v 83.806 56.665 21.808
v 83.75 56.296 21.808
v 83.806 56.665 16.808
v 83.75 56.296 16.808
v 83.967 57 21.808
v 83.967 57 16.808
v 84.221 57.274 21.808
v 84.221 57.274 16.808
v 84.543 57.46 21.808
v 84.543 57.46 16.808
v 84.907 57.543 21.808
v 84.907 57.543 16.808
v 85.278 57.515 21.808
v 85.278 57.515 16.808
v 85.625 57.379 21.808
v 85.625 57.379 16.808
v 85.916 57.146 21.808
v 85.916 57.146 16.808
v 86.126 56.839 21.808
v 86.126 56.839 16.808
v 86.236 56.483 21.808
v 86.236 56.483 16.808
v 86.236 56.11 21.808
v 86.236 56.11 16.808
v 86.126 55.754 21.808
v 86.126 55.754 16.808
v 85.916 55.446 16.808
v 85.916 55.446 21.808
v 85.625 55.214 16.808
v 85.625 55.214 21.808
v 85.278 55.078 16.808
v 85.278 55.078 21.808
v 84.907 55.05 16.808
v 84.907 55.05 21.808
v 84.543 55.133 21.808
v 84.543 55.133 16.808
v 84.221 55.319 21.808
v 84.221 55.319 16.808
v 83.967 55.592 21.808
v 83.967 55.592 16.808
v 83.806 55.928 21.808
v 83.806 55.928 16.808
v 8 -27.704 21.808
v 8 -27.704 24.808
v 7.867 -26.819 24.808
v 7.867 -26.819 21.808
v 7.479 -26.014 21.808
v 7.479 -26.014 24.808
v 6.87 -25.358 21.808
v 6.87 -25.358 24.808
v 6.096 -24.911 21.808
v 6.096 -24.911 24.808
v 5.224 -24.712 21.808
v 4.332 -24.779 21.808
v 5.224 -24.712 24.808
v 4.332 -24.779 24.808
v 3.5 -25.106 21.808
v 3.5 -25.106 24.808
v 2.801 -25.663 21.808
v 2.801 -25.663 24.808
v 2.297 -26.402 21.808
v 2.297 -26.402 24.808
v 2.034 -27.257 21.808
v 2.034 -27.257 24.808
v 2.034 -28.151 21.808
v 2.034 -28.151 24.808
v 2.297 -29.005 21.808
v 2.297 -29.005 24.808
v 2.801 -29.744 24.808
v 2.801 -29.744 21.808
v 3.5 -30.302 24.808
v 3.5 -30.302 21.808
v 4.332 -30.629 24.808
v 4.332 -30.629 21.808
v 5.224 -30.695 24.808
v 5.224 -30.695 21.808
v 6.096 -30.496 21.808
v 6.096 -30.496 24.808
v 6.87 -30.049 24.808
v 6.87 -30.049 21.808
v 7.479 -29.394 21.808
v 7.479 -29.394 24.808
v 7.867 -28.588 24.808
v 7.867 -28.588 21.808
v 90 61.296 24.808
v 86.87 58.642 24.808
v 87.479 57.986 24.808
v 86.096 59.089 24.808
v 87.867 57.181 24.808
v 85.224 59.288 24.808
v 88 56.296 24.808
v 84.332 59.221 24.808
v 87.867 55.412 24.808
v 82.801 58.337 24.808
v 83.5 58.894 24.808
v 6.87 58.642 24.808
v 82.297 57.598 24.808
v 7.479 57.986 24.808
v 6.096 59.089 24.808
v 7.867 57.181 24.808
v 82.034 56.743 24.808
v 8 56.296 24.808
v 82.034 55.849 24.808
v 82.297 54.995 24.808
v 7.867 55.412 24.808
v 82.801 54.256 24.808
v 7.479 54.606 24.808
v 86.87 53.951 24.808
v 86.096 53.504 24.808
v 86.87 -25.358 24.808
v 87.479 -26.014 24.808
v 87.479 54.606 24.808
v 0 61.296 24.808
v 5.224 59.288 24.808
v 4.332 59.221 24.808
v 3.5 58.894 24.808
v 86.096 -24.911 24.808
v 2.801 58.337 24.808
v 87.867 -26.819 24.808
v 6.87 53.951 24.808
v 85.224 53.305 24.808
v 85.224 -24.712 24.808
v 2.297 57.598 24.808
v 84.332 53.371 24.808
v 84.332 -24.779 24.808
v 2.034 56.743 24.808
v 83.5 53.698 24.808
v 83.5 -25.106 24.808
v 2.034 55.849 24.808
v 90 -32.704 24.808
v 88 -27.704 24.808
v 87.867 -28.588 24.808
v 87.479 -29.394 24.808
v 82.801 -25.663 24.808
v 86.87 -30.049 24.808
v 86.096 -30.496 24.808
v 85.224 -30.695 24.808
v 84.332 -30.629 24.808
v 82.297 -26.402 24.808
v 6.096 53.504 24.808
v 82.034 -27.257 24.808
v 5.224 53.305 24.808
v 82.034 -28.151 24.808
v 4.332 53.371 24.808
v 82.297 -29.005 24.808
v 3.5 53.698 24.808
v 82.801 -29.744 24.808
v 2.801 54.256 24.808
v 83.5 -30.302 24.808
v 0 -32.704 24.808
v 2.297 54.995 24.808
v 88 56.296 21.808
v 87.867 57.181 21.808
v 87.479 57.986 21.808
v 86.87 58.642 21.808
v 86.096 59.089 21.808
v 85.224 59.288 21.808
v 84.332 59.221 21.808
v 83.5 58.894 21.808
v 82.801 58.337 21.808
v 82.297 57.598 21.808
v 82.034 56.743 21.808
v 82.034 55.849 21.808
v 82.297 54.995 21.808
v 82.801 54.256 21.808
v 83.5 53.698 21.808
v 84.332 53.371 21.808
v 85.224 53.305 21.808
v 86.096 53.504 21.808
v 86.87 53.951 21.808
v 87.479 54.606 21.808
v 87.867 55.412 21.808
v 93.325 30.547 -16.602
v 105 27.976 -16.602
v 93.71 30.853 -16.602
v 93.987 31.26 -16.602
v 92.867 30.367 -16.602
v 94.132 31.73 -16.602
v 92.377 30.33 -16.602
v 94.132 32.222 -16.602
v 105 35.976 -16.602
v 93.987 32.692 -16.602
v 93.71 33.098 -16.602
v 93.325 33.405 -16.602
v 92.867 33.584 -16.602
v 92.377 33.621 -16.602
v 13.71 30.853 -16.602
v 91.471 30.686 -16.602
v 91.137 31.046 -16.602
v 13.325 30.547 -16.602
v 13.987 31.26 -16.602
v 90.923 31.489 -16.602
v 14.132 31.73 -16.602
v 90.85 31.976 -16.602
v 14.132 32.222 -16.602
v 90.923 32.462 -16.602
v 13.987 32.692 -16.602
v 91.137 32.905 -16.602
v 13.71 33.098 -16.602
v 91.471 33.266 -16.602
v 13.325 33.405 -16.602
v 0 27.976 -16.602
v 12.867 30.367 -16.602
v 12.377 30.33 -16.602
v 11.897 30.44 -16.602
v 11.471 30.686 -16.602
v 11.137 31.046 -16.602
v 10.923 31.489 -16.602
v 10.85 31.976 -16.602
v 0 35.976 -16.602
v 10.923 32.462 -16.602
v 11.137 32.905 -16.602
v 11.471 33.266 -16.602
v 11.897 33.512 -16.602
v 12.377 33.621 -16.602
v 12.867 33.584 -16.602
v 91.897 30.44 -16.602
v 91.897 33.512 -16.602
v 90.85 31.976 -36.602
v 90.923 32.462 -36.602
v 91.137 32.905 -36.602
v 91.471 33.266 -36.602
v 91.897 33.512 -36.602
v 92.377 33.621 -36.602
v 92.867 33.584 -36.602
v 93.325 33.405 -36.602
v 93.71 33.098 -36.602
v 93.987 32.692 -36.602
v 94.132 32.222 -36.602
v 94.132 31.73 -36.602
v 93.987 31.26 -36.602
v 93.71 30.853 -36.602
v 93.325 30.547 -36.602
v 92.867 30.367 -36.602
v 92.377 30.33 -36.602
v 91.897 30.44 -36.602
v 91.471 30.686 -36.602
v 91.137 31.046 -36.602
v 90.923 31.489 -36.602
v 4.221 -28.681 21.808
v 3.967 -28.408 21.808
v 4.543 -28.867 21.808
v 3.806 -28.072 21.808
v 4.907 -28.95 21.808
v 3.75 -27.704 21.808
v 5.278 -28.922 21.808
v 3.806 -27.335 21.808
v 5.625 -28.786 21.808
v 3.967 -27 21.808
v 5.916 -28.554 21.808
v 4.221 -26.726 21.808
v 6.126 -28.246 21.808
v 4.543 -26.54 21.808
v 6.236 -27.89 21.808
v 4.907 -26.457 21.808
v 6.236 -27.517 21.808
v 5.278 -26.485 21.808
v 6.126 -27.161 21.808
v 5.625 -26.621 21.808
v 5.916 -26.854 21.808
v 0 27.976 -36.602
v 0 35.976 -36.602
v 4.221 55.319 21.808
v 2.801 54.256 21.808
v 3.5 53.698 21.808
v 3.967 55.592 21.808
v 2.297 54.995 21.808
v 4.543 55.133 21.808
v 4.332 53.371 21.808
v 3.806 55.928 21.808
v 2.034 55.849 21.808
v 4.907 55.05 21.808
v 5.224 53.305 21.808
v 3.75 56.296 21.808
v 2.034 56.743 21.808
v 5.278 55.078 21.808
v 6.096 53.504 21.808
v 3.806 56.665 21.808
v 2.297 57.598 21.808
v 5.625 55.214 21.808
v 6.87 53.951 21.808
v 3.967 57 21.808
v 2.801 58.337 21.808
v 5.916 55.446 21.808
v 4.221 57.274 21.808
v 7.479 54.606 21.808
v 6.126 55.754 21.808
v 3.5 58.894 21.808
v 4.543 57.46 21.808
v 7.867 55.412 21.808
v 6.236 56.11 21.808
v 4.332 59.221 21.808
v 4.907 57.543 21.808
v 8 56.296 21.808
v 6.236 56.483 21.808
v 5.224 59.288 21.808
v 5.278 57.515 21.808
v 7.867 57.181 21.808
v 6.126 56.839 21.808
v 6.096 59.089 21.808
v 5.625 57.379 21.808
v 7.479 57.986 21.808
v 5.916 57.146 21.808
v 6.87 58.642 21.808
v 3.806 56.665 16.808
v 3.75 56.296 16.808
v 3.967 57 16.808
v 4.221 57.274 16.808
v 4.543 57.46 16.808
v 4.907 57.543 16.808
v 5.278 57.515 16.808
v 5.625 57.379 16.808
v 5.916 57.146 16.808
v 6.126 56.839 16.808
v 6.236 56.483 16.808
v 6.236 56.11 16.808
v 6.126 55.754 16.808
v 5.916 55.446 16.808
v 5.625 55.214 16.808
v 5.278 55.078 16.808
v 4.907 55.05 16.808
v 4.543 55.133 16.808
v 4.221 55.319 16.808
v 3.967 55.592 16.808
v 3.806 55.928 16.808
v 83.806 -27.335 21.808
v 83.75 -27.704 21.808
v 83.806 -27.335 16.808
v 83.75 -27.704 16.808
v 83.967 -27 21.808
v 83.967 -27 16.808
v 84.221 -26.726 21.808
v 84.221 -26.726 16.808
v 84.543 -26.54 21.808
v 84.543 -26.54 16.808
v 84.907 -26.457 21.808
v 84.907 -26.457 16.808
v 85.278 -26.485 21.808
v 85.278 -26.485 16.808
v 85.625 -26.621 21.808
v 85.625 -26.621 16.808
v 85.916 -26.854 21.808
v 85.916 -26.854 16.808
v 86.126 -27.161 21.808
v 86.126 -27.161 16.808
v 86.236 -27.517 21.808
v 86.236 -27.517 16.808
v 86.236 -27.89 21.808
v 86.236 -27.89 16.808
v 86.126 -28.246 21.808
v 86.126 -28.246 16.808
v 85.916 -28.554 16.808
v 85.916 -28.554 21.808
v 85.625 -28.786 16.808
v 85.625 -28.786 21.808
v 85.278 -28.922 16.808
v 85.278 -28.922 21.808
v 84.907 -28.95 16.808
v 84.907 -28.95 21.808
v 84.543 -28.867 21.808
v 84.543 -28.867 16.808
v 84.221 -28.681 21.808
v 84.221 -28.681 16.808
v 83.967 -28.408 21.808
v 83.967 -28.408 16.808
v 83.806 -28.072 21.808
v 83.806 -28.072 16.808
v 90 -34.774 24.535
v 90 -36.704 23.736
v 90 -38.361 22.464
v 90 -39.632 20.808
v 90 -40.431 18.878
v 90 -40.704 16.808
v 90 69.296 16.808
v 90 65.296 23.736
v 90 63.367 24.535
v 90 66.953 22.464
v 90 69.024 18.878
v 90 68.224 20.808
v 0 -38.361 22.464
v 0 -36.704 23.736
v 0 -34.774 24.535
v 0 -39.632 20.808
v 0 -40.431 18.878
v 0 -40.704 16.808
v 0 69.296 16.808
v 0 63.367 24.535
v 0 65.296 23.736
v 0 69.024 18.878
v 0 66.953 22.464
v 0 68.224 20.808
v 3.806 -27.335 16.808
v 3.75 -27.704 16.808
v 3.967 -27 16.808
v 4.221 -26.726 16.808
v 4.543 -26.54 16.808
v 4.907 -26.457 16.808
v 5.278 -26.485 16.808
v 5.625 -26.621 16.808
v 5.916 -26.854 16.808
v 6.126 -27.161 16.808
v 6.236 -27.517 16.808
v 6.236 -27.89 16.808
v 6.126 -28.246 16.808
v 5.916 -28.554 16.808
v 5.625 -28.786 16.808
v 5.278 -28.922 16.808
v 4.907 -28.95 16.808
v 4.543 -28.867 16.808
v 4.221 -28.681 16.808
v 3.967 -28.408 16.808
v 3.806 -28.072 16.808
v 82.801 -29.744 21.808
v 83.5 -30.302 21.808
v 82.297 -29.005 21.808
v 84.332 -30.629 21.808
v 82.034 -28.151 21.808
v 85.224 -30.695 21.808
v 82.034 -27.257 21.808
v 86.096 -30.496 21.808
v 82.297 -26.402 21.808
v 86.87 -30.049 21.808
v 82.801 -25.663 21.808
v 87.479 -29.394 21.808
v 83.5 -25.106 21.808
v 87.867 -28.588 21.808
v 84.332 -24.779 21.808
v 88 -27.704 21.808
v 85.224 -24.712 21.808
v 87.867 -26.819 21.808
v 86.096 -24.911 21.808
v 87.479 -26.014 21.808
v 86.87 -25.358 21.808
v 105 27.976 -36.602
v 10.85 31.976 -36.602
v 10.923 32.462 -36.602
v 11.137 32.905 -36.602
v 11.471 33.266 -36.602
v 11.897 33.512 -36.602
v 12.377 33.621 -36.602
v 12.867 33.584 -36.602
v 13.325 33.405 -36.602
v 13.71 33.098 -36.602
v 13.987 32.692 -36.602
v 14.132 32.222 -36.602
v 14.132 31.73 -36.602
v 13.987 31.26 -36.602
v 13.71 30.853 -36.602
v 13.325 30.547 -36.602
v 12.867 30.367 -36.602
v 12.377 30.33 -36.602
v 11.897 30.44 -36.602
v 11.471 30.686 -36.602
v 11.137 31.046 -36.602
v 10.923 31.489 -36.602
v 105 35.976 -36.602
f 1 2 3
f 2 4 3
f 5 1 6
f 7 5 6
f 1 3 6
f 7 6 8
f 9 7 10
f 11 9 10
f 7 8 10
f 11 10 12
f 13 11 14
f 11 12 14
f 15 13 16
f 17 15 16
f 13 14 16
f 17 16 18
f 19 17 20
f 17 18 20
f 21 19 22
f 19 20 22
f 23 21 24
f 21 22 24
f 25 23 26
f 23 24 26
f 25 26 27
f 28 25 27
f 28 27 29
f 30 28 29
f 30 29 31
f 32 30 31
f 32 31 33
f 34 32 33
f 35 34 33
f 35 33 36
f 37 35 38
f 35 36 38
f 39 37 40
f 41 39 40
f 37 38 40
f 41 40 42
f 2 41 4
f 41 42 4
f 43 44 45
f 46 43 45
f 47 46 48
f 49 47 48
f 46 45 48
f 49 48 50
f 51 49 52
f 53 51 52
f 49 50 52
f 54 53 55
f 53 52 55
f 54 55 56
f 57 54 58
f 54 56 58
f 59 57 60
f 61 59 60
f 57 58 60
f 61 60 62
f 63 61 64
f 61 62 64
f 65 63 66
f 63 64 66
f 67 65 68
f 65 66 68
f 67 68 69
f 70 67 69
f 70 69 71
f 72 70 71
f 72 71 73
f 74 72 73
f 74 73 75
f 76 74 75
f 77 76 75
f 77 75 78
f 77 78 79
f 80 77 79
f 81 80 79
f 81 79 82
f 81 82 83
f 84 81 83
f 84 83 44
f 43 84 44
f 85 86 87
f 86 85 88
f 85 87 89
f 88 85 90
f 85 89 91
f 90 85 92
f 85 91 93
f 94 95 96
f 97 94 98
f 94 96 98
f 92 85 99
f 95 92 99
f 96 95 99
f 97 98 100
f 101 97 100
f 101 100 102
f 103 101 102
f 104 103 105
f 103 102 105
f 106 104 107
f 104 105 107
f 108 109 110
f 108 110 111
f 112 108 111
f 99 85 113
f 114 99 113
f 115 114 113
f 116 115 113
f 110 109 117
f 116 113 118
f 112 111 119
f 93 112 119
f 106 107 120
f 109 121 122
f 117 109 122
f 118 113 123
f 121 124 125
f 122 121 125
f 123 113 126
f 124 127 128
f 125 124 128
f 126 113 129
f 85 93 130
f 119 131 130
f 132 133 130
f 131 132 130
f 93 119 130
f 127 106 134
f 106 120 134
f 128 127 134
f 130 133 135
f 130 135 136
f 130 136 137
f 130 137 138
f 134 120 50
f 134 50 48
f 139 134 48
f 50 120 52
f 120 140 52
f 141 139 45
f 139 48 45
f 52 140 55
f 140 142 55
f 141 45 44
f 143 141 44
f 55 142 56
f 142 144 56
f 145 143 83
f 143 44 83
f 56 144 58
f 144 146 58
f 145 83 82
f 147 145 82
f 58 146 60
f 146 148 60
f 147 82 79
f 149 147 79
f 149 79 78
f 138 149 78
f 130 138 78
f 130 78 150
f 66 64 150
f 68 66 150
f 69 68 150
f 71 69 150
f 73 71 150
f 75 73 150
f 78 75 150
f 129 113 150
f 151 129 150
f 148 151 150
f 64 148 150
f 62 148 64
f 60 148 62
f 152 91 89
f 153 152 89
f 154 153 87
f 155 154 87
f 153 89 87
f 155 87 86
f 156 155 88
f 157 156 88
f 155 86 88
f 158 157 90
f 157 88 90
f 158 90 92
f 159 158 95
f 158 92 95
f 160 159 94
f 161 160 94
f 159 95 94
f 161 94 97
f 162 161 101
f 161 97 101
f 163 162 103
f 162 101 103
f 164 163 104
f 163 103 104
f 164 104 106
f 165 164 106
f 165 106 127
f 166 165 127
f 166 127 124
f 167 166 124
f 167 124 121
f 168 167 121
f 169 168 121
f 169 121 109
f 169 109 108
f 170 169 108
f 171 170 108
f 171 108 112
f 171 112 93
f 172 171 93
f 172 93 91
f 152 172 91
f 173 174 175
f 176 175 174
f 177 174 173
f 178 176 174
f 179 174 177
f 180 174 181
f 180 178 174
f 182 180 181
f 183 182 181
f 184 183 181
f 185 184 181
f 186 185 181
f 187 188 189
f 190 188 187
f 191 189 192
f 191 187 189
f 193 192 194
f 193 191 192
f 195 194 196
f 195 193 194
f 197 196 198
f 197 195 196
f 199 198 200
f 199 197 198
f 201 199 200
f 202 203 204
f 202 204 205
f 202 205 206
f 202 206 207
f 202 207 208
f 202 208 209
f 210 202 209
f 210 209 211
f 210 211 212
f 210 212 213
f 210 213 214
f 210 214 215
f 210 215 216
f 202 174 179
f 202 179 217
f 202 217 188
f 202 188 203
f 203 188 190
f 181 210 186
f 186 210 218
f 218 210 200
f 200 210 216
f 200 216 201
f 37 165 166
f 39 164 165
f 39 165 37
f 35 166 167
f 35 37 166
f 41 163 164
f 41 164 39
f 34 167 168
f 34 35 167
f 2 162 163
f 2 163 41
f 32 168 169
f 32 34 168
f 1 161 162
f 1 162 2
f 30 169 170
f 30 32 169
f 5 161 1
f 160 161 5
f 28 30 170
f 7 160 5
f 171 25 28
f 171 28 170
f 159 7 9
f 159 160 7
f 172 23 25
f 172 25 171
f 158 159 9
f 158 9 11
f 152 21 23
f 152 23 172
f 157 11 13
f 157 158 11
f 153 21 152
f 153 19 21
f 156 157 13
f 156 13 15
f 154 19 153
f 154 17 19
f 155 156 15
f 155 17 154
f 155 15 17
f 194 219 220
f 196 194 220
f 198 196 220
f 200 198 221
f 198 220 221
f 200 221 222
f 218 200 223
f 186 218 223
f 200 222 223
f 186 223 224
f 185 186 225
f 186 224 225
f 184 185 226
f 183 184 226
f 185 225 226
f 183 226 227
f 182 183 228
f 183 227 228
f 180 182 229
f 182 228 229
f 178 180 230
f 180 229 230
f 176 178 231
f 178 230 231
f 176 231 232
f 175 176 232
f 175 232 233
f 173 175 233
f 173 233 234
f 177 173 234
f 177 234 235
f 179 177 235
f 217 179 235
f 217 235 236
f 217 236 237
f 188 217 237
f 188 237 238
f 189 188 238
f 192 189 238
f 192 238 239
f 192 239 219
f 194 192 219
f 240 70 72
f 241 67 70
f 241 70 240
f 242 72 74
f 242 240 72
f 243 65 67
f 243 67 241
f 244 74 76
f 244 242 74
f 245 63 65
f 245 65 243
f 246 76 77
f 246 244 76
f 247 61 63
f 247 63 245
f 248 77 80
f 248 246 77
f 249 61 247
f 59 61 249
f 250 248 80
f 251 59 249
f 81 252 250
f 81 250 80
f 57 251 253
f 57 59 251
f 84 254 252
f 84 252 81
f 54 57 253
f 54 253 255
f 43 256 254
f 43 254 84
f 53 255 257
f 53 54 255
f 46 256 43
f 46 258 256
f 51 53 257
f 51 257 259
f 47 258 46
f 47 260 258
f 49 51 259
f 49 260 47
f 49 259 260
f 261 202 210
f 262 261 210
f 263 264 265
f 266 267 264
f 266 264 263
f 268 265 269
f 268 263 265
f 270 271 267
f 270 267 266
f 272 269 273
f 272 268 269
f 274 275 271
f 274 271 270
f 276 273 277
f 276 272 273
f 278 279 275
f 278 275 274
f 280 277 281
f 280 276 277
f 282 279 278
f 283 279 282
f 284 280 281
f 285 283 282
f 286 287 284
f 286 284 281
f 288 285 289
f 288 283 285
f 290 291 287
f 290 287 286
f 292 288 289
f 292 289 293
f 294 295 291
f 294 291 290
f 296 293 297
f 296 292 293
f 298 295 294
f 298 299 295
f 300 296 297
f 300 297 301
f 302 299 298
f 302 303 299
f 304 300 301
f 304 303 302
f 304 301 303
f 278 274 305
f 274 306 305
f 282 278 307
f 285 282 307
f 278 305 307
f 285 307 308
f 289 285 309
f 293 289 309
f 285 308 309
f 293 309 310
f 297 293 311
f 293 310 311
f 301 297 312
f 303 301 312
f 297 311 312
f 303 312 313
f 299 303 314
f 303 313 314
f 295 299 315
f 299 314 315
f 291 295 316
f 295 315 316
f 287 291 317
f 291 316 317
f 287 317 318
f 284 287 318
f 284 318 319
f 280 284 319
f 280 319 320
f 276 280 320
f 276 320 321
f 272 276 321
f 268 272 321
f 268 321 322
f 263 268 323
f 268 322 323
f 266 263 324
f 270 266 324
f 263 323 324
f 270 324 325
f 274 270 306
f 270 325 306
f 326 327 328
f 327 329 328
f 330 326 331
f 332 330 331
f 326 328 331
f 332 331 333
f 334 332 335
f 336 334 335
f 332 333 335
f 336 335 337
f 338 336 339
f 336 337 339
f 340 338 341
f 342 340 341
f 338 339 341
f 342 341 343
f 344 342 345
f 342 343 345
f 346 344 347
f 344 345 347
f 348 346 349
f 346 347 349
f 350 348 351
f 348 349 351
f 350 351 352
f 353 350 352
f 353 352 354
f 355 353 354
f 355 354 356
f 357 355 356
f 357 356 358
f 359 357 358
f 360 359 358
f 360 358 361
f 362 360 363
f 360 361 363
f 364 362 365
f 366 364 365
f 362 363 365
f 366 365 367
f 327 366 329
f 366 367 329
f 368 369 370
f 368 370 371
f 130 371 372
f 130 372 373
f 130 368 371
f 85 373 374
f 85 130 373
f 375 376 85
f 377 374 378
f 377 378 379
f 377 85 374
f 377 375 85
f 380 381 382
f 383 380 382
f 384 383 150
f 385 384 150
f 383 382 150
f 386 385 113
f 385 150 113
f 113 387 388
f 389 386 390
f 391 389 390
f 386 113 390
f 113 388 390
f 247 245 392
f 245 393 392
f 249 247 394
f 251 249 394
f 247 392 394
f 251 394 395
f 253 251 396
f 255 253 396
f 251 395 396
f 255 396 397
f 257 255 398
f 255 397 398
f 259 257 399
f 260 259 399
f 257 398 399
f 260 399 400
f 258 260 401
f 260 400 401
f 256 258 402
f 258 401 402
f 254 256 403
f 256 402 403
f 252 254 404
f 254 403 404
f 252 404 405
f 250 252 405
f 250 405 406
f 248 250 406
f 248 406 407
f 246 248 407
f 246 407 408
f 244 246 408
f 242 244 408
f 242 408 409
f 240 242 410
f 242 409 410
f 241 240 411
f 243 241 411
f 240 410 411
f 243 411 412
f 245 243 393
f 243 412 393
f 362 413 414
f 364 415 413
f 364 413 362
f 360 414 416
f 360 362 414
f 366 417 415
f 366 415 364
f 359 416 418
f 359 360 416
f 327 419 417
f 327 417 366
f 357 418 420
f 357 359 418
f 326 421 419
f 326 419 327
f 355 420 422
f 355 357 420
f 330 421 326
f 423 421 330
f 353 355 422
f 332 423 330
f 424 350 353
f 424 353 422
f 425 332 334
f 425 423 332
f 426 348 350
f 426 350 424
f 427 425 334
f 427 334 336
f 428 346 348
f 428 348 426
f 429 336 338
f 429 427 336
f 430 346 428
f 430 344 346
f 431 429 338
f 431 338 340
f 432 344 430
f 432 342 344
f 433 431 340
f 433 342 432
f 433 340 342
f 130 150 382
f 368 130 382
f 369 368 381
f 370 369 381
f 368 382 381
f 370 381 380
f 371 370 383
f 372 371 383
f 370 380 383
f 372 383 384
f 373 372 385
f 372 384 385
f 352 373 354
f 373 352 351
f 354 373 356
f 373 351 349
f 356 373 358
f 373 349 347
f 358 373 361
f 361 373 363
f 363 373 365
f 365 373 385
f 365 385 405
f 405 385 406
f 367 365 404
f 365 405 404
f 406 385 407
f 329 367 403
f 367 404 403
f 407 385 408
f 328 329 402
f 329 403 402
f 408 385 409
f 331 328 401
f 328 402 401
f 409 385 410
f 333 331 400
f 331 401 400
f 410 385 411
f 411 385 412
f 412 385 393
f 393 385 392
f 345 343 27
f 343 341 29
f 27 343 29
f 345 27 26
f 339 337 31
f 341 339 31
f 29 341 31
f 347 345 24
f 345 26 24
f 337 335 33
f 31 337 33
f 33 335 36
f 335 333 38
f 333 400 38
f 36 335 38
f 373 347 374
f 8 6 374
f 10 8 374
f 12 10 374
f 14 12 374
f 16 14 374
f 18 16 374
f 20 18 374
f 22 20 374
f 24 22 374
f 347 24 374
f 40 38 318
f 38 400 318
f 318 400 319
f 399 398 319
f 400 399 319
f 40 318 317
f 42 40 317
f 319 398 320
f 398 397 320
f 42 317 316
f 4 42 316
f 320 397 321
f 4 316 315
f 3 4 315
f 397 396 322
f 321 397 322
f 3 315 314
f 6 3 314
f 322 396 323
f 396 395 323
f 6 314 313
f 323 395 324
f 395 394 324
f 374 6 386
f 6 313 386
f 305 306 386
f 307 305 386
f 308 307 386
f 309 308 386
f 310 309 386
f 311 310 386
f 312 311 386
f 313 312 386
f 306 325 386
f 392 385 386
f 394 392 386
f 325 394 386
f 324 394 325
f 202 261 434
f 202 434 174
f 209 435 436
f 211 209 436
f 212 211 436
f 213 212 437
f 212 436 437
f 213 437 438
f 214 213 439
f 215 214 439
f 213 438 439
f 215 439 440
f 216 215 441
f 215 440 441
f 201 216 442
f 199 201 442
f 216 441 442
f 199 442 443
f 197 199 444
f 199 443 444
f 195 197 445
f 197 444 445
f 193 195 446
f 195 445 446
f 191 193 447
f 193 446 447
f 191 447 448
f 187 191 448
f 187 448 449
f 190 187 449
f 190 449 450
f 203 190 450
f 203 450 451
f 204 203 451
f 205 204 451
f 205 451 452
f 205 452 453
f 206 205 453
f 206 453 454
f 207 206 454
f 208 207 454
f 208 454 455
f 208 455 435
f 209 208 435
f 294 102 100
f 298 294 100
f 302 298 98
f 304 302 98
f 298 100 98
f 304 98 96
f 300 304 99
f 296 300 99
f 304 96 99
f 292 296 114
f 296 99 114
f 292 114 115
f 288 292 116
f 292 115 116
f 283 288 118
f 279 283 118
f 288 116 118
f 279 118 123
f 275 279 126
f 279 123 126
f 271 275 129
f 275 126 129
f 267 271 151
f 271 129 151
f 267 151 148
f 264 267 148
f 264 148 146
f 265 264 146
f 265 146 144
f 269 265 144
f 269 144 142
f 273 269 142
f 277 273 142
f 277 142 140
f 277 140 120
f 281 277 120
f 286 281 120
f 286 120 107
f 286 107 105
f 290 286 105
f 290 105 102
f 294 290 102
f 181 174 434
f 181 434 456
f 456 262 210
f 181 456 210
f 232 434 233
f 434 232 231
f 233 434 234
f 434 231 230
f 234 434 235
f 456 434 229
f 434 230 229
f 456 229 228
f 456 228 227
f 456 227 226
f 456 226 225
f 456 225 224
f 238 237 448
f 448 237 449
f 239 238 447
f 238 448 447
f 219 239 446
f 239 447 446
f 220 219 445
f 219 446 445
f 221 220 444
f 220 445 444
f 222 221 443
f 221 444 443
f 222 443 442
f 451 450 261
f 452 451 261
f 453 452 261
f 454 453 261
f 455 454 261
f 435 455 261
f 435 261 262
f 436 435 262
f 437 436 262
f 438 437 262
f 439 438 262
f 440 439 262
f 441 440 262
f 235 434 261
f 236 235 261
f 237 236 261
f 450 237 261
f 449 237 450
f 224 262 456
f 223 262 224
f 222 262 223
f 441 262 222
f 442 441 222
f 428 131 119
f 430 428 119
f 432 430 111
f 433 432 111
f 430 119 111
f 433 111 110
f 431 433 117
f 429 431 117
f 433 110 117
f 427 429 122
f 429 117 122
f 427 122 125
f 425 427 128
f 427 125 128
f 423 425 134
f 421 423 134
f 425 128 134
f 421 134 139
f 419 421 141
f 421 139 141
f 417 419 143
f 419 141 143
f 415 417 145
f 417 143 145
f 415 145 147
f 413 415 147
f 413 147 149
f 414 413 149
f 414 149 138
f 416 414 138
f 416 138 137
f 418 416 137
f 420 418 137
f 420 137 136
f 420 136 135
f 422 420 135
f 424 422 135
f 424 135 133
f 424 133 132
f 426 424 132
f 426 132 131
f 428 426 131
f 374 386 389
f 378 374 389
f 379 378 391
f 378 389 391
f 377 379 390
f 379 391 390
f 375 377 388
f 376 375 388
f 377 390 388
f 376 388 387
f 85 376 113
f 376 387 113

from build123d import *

# Parameters (mm, degrees)
F1_DEPTH       = 90
F3_D           = 2.5
F3_CBORE_D     = 6
F3_CBORE_DEPTH = 3
F4_W           = 8
F4_H           = 20
F5_DEPTH       = 105
F7_D           = 3.3


with BuildPart() as f1:
    # F0 (on Right) → F1 (new body)
    with BuildSketch(Plane.YZ):
        with BuildLine():
            Line((61.2962363439, 24.8076301803), (-32.7037636561, 24.8076301803))
            ThreePointArc((-32.7037636561, 24.8076301803), (-38.3606179056, 22.4644844298), (-40.7037636561, 16.8076301803))
            Line((-40.7037636561, 16.8076301803), (69.2962363439, 16.8076301803))
            ThreePointArc((69.2962363439, 16.8076301803), (66.9530905934, 22.4644844298), (61.2962363439, 24.8076301803))
        make_face()
    extrude(amount=F1_DEPTH)

    # F3 (through all)
    with Locations(Plane.XY.offset(24.8076301803)):
        with Locations((5, 56.2962363439), (85, 56.2962363439), (85, -27.7037636561), (5, -27.7037636561)):
            CounterBoreHole(F3_D / 2, F3_CBORE_D / 2, F3_CBORE_DEPTH)


with BuildPart() as f5:
    # F4 (on Right) → F5 (new body)
    with BuildSketch(Plane.YZ):
        with Locations((31.9756090045, -26.6022793886)):
            Rectangle(F4_W, F4_H)
    extrude(amount=F5_DEPTH)

    # F7 (through all)
    with Locations(Plane.XY.offset(-16.6022793886)):
        with Locations((12.5, 31.9756090045), (92.5, 31.9756090045)):
            Hole(F7_D / 2)


solid = Compound([f1.part, f5.part])
